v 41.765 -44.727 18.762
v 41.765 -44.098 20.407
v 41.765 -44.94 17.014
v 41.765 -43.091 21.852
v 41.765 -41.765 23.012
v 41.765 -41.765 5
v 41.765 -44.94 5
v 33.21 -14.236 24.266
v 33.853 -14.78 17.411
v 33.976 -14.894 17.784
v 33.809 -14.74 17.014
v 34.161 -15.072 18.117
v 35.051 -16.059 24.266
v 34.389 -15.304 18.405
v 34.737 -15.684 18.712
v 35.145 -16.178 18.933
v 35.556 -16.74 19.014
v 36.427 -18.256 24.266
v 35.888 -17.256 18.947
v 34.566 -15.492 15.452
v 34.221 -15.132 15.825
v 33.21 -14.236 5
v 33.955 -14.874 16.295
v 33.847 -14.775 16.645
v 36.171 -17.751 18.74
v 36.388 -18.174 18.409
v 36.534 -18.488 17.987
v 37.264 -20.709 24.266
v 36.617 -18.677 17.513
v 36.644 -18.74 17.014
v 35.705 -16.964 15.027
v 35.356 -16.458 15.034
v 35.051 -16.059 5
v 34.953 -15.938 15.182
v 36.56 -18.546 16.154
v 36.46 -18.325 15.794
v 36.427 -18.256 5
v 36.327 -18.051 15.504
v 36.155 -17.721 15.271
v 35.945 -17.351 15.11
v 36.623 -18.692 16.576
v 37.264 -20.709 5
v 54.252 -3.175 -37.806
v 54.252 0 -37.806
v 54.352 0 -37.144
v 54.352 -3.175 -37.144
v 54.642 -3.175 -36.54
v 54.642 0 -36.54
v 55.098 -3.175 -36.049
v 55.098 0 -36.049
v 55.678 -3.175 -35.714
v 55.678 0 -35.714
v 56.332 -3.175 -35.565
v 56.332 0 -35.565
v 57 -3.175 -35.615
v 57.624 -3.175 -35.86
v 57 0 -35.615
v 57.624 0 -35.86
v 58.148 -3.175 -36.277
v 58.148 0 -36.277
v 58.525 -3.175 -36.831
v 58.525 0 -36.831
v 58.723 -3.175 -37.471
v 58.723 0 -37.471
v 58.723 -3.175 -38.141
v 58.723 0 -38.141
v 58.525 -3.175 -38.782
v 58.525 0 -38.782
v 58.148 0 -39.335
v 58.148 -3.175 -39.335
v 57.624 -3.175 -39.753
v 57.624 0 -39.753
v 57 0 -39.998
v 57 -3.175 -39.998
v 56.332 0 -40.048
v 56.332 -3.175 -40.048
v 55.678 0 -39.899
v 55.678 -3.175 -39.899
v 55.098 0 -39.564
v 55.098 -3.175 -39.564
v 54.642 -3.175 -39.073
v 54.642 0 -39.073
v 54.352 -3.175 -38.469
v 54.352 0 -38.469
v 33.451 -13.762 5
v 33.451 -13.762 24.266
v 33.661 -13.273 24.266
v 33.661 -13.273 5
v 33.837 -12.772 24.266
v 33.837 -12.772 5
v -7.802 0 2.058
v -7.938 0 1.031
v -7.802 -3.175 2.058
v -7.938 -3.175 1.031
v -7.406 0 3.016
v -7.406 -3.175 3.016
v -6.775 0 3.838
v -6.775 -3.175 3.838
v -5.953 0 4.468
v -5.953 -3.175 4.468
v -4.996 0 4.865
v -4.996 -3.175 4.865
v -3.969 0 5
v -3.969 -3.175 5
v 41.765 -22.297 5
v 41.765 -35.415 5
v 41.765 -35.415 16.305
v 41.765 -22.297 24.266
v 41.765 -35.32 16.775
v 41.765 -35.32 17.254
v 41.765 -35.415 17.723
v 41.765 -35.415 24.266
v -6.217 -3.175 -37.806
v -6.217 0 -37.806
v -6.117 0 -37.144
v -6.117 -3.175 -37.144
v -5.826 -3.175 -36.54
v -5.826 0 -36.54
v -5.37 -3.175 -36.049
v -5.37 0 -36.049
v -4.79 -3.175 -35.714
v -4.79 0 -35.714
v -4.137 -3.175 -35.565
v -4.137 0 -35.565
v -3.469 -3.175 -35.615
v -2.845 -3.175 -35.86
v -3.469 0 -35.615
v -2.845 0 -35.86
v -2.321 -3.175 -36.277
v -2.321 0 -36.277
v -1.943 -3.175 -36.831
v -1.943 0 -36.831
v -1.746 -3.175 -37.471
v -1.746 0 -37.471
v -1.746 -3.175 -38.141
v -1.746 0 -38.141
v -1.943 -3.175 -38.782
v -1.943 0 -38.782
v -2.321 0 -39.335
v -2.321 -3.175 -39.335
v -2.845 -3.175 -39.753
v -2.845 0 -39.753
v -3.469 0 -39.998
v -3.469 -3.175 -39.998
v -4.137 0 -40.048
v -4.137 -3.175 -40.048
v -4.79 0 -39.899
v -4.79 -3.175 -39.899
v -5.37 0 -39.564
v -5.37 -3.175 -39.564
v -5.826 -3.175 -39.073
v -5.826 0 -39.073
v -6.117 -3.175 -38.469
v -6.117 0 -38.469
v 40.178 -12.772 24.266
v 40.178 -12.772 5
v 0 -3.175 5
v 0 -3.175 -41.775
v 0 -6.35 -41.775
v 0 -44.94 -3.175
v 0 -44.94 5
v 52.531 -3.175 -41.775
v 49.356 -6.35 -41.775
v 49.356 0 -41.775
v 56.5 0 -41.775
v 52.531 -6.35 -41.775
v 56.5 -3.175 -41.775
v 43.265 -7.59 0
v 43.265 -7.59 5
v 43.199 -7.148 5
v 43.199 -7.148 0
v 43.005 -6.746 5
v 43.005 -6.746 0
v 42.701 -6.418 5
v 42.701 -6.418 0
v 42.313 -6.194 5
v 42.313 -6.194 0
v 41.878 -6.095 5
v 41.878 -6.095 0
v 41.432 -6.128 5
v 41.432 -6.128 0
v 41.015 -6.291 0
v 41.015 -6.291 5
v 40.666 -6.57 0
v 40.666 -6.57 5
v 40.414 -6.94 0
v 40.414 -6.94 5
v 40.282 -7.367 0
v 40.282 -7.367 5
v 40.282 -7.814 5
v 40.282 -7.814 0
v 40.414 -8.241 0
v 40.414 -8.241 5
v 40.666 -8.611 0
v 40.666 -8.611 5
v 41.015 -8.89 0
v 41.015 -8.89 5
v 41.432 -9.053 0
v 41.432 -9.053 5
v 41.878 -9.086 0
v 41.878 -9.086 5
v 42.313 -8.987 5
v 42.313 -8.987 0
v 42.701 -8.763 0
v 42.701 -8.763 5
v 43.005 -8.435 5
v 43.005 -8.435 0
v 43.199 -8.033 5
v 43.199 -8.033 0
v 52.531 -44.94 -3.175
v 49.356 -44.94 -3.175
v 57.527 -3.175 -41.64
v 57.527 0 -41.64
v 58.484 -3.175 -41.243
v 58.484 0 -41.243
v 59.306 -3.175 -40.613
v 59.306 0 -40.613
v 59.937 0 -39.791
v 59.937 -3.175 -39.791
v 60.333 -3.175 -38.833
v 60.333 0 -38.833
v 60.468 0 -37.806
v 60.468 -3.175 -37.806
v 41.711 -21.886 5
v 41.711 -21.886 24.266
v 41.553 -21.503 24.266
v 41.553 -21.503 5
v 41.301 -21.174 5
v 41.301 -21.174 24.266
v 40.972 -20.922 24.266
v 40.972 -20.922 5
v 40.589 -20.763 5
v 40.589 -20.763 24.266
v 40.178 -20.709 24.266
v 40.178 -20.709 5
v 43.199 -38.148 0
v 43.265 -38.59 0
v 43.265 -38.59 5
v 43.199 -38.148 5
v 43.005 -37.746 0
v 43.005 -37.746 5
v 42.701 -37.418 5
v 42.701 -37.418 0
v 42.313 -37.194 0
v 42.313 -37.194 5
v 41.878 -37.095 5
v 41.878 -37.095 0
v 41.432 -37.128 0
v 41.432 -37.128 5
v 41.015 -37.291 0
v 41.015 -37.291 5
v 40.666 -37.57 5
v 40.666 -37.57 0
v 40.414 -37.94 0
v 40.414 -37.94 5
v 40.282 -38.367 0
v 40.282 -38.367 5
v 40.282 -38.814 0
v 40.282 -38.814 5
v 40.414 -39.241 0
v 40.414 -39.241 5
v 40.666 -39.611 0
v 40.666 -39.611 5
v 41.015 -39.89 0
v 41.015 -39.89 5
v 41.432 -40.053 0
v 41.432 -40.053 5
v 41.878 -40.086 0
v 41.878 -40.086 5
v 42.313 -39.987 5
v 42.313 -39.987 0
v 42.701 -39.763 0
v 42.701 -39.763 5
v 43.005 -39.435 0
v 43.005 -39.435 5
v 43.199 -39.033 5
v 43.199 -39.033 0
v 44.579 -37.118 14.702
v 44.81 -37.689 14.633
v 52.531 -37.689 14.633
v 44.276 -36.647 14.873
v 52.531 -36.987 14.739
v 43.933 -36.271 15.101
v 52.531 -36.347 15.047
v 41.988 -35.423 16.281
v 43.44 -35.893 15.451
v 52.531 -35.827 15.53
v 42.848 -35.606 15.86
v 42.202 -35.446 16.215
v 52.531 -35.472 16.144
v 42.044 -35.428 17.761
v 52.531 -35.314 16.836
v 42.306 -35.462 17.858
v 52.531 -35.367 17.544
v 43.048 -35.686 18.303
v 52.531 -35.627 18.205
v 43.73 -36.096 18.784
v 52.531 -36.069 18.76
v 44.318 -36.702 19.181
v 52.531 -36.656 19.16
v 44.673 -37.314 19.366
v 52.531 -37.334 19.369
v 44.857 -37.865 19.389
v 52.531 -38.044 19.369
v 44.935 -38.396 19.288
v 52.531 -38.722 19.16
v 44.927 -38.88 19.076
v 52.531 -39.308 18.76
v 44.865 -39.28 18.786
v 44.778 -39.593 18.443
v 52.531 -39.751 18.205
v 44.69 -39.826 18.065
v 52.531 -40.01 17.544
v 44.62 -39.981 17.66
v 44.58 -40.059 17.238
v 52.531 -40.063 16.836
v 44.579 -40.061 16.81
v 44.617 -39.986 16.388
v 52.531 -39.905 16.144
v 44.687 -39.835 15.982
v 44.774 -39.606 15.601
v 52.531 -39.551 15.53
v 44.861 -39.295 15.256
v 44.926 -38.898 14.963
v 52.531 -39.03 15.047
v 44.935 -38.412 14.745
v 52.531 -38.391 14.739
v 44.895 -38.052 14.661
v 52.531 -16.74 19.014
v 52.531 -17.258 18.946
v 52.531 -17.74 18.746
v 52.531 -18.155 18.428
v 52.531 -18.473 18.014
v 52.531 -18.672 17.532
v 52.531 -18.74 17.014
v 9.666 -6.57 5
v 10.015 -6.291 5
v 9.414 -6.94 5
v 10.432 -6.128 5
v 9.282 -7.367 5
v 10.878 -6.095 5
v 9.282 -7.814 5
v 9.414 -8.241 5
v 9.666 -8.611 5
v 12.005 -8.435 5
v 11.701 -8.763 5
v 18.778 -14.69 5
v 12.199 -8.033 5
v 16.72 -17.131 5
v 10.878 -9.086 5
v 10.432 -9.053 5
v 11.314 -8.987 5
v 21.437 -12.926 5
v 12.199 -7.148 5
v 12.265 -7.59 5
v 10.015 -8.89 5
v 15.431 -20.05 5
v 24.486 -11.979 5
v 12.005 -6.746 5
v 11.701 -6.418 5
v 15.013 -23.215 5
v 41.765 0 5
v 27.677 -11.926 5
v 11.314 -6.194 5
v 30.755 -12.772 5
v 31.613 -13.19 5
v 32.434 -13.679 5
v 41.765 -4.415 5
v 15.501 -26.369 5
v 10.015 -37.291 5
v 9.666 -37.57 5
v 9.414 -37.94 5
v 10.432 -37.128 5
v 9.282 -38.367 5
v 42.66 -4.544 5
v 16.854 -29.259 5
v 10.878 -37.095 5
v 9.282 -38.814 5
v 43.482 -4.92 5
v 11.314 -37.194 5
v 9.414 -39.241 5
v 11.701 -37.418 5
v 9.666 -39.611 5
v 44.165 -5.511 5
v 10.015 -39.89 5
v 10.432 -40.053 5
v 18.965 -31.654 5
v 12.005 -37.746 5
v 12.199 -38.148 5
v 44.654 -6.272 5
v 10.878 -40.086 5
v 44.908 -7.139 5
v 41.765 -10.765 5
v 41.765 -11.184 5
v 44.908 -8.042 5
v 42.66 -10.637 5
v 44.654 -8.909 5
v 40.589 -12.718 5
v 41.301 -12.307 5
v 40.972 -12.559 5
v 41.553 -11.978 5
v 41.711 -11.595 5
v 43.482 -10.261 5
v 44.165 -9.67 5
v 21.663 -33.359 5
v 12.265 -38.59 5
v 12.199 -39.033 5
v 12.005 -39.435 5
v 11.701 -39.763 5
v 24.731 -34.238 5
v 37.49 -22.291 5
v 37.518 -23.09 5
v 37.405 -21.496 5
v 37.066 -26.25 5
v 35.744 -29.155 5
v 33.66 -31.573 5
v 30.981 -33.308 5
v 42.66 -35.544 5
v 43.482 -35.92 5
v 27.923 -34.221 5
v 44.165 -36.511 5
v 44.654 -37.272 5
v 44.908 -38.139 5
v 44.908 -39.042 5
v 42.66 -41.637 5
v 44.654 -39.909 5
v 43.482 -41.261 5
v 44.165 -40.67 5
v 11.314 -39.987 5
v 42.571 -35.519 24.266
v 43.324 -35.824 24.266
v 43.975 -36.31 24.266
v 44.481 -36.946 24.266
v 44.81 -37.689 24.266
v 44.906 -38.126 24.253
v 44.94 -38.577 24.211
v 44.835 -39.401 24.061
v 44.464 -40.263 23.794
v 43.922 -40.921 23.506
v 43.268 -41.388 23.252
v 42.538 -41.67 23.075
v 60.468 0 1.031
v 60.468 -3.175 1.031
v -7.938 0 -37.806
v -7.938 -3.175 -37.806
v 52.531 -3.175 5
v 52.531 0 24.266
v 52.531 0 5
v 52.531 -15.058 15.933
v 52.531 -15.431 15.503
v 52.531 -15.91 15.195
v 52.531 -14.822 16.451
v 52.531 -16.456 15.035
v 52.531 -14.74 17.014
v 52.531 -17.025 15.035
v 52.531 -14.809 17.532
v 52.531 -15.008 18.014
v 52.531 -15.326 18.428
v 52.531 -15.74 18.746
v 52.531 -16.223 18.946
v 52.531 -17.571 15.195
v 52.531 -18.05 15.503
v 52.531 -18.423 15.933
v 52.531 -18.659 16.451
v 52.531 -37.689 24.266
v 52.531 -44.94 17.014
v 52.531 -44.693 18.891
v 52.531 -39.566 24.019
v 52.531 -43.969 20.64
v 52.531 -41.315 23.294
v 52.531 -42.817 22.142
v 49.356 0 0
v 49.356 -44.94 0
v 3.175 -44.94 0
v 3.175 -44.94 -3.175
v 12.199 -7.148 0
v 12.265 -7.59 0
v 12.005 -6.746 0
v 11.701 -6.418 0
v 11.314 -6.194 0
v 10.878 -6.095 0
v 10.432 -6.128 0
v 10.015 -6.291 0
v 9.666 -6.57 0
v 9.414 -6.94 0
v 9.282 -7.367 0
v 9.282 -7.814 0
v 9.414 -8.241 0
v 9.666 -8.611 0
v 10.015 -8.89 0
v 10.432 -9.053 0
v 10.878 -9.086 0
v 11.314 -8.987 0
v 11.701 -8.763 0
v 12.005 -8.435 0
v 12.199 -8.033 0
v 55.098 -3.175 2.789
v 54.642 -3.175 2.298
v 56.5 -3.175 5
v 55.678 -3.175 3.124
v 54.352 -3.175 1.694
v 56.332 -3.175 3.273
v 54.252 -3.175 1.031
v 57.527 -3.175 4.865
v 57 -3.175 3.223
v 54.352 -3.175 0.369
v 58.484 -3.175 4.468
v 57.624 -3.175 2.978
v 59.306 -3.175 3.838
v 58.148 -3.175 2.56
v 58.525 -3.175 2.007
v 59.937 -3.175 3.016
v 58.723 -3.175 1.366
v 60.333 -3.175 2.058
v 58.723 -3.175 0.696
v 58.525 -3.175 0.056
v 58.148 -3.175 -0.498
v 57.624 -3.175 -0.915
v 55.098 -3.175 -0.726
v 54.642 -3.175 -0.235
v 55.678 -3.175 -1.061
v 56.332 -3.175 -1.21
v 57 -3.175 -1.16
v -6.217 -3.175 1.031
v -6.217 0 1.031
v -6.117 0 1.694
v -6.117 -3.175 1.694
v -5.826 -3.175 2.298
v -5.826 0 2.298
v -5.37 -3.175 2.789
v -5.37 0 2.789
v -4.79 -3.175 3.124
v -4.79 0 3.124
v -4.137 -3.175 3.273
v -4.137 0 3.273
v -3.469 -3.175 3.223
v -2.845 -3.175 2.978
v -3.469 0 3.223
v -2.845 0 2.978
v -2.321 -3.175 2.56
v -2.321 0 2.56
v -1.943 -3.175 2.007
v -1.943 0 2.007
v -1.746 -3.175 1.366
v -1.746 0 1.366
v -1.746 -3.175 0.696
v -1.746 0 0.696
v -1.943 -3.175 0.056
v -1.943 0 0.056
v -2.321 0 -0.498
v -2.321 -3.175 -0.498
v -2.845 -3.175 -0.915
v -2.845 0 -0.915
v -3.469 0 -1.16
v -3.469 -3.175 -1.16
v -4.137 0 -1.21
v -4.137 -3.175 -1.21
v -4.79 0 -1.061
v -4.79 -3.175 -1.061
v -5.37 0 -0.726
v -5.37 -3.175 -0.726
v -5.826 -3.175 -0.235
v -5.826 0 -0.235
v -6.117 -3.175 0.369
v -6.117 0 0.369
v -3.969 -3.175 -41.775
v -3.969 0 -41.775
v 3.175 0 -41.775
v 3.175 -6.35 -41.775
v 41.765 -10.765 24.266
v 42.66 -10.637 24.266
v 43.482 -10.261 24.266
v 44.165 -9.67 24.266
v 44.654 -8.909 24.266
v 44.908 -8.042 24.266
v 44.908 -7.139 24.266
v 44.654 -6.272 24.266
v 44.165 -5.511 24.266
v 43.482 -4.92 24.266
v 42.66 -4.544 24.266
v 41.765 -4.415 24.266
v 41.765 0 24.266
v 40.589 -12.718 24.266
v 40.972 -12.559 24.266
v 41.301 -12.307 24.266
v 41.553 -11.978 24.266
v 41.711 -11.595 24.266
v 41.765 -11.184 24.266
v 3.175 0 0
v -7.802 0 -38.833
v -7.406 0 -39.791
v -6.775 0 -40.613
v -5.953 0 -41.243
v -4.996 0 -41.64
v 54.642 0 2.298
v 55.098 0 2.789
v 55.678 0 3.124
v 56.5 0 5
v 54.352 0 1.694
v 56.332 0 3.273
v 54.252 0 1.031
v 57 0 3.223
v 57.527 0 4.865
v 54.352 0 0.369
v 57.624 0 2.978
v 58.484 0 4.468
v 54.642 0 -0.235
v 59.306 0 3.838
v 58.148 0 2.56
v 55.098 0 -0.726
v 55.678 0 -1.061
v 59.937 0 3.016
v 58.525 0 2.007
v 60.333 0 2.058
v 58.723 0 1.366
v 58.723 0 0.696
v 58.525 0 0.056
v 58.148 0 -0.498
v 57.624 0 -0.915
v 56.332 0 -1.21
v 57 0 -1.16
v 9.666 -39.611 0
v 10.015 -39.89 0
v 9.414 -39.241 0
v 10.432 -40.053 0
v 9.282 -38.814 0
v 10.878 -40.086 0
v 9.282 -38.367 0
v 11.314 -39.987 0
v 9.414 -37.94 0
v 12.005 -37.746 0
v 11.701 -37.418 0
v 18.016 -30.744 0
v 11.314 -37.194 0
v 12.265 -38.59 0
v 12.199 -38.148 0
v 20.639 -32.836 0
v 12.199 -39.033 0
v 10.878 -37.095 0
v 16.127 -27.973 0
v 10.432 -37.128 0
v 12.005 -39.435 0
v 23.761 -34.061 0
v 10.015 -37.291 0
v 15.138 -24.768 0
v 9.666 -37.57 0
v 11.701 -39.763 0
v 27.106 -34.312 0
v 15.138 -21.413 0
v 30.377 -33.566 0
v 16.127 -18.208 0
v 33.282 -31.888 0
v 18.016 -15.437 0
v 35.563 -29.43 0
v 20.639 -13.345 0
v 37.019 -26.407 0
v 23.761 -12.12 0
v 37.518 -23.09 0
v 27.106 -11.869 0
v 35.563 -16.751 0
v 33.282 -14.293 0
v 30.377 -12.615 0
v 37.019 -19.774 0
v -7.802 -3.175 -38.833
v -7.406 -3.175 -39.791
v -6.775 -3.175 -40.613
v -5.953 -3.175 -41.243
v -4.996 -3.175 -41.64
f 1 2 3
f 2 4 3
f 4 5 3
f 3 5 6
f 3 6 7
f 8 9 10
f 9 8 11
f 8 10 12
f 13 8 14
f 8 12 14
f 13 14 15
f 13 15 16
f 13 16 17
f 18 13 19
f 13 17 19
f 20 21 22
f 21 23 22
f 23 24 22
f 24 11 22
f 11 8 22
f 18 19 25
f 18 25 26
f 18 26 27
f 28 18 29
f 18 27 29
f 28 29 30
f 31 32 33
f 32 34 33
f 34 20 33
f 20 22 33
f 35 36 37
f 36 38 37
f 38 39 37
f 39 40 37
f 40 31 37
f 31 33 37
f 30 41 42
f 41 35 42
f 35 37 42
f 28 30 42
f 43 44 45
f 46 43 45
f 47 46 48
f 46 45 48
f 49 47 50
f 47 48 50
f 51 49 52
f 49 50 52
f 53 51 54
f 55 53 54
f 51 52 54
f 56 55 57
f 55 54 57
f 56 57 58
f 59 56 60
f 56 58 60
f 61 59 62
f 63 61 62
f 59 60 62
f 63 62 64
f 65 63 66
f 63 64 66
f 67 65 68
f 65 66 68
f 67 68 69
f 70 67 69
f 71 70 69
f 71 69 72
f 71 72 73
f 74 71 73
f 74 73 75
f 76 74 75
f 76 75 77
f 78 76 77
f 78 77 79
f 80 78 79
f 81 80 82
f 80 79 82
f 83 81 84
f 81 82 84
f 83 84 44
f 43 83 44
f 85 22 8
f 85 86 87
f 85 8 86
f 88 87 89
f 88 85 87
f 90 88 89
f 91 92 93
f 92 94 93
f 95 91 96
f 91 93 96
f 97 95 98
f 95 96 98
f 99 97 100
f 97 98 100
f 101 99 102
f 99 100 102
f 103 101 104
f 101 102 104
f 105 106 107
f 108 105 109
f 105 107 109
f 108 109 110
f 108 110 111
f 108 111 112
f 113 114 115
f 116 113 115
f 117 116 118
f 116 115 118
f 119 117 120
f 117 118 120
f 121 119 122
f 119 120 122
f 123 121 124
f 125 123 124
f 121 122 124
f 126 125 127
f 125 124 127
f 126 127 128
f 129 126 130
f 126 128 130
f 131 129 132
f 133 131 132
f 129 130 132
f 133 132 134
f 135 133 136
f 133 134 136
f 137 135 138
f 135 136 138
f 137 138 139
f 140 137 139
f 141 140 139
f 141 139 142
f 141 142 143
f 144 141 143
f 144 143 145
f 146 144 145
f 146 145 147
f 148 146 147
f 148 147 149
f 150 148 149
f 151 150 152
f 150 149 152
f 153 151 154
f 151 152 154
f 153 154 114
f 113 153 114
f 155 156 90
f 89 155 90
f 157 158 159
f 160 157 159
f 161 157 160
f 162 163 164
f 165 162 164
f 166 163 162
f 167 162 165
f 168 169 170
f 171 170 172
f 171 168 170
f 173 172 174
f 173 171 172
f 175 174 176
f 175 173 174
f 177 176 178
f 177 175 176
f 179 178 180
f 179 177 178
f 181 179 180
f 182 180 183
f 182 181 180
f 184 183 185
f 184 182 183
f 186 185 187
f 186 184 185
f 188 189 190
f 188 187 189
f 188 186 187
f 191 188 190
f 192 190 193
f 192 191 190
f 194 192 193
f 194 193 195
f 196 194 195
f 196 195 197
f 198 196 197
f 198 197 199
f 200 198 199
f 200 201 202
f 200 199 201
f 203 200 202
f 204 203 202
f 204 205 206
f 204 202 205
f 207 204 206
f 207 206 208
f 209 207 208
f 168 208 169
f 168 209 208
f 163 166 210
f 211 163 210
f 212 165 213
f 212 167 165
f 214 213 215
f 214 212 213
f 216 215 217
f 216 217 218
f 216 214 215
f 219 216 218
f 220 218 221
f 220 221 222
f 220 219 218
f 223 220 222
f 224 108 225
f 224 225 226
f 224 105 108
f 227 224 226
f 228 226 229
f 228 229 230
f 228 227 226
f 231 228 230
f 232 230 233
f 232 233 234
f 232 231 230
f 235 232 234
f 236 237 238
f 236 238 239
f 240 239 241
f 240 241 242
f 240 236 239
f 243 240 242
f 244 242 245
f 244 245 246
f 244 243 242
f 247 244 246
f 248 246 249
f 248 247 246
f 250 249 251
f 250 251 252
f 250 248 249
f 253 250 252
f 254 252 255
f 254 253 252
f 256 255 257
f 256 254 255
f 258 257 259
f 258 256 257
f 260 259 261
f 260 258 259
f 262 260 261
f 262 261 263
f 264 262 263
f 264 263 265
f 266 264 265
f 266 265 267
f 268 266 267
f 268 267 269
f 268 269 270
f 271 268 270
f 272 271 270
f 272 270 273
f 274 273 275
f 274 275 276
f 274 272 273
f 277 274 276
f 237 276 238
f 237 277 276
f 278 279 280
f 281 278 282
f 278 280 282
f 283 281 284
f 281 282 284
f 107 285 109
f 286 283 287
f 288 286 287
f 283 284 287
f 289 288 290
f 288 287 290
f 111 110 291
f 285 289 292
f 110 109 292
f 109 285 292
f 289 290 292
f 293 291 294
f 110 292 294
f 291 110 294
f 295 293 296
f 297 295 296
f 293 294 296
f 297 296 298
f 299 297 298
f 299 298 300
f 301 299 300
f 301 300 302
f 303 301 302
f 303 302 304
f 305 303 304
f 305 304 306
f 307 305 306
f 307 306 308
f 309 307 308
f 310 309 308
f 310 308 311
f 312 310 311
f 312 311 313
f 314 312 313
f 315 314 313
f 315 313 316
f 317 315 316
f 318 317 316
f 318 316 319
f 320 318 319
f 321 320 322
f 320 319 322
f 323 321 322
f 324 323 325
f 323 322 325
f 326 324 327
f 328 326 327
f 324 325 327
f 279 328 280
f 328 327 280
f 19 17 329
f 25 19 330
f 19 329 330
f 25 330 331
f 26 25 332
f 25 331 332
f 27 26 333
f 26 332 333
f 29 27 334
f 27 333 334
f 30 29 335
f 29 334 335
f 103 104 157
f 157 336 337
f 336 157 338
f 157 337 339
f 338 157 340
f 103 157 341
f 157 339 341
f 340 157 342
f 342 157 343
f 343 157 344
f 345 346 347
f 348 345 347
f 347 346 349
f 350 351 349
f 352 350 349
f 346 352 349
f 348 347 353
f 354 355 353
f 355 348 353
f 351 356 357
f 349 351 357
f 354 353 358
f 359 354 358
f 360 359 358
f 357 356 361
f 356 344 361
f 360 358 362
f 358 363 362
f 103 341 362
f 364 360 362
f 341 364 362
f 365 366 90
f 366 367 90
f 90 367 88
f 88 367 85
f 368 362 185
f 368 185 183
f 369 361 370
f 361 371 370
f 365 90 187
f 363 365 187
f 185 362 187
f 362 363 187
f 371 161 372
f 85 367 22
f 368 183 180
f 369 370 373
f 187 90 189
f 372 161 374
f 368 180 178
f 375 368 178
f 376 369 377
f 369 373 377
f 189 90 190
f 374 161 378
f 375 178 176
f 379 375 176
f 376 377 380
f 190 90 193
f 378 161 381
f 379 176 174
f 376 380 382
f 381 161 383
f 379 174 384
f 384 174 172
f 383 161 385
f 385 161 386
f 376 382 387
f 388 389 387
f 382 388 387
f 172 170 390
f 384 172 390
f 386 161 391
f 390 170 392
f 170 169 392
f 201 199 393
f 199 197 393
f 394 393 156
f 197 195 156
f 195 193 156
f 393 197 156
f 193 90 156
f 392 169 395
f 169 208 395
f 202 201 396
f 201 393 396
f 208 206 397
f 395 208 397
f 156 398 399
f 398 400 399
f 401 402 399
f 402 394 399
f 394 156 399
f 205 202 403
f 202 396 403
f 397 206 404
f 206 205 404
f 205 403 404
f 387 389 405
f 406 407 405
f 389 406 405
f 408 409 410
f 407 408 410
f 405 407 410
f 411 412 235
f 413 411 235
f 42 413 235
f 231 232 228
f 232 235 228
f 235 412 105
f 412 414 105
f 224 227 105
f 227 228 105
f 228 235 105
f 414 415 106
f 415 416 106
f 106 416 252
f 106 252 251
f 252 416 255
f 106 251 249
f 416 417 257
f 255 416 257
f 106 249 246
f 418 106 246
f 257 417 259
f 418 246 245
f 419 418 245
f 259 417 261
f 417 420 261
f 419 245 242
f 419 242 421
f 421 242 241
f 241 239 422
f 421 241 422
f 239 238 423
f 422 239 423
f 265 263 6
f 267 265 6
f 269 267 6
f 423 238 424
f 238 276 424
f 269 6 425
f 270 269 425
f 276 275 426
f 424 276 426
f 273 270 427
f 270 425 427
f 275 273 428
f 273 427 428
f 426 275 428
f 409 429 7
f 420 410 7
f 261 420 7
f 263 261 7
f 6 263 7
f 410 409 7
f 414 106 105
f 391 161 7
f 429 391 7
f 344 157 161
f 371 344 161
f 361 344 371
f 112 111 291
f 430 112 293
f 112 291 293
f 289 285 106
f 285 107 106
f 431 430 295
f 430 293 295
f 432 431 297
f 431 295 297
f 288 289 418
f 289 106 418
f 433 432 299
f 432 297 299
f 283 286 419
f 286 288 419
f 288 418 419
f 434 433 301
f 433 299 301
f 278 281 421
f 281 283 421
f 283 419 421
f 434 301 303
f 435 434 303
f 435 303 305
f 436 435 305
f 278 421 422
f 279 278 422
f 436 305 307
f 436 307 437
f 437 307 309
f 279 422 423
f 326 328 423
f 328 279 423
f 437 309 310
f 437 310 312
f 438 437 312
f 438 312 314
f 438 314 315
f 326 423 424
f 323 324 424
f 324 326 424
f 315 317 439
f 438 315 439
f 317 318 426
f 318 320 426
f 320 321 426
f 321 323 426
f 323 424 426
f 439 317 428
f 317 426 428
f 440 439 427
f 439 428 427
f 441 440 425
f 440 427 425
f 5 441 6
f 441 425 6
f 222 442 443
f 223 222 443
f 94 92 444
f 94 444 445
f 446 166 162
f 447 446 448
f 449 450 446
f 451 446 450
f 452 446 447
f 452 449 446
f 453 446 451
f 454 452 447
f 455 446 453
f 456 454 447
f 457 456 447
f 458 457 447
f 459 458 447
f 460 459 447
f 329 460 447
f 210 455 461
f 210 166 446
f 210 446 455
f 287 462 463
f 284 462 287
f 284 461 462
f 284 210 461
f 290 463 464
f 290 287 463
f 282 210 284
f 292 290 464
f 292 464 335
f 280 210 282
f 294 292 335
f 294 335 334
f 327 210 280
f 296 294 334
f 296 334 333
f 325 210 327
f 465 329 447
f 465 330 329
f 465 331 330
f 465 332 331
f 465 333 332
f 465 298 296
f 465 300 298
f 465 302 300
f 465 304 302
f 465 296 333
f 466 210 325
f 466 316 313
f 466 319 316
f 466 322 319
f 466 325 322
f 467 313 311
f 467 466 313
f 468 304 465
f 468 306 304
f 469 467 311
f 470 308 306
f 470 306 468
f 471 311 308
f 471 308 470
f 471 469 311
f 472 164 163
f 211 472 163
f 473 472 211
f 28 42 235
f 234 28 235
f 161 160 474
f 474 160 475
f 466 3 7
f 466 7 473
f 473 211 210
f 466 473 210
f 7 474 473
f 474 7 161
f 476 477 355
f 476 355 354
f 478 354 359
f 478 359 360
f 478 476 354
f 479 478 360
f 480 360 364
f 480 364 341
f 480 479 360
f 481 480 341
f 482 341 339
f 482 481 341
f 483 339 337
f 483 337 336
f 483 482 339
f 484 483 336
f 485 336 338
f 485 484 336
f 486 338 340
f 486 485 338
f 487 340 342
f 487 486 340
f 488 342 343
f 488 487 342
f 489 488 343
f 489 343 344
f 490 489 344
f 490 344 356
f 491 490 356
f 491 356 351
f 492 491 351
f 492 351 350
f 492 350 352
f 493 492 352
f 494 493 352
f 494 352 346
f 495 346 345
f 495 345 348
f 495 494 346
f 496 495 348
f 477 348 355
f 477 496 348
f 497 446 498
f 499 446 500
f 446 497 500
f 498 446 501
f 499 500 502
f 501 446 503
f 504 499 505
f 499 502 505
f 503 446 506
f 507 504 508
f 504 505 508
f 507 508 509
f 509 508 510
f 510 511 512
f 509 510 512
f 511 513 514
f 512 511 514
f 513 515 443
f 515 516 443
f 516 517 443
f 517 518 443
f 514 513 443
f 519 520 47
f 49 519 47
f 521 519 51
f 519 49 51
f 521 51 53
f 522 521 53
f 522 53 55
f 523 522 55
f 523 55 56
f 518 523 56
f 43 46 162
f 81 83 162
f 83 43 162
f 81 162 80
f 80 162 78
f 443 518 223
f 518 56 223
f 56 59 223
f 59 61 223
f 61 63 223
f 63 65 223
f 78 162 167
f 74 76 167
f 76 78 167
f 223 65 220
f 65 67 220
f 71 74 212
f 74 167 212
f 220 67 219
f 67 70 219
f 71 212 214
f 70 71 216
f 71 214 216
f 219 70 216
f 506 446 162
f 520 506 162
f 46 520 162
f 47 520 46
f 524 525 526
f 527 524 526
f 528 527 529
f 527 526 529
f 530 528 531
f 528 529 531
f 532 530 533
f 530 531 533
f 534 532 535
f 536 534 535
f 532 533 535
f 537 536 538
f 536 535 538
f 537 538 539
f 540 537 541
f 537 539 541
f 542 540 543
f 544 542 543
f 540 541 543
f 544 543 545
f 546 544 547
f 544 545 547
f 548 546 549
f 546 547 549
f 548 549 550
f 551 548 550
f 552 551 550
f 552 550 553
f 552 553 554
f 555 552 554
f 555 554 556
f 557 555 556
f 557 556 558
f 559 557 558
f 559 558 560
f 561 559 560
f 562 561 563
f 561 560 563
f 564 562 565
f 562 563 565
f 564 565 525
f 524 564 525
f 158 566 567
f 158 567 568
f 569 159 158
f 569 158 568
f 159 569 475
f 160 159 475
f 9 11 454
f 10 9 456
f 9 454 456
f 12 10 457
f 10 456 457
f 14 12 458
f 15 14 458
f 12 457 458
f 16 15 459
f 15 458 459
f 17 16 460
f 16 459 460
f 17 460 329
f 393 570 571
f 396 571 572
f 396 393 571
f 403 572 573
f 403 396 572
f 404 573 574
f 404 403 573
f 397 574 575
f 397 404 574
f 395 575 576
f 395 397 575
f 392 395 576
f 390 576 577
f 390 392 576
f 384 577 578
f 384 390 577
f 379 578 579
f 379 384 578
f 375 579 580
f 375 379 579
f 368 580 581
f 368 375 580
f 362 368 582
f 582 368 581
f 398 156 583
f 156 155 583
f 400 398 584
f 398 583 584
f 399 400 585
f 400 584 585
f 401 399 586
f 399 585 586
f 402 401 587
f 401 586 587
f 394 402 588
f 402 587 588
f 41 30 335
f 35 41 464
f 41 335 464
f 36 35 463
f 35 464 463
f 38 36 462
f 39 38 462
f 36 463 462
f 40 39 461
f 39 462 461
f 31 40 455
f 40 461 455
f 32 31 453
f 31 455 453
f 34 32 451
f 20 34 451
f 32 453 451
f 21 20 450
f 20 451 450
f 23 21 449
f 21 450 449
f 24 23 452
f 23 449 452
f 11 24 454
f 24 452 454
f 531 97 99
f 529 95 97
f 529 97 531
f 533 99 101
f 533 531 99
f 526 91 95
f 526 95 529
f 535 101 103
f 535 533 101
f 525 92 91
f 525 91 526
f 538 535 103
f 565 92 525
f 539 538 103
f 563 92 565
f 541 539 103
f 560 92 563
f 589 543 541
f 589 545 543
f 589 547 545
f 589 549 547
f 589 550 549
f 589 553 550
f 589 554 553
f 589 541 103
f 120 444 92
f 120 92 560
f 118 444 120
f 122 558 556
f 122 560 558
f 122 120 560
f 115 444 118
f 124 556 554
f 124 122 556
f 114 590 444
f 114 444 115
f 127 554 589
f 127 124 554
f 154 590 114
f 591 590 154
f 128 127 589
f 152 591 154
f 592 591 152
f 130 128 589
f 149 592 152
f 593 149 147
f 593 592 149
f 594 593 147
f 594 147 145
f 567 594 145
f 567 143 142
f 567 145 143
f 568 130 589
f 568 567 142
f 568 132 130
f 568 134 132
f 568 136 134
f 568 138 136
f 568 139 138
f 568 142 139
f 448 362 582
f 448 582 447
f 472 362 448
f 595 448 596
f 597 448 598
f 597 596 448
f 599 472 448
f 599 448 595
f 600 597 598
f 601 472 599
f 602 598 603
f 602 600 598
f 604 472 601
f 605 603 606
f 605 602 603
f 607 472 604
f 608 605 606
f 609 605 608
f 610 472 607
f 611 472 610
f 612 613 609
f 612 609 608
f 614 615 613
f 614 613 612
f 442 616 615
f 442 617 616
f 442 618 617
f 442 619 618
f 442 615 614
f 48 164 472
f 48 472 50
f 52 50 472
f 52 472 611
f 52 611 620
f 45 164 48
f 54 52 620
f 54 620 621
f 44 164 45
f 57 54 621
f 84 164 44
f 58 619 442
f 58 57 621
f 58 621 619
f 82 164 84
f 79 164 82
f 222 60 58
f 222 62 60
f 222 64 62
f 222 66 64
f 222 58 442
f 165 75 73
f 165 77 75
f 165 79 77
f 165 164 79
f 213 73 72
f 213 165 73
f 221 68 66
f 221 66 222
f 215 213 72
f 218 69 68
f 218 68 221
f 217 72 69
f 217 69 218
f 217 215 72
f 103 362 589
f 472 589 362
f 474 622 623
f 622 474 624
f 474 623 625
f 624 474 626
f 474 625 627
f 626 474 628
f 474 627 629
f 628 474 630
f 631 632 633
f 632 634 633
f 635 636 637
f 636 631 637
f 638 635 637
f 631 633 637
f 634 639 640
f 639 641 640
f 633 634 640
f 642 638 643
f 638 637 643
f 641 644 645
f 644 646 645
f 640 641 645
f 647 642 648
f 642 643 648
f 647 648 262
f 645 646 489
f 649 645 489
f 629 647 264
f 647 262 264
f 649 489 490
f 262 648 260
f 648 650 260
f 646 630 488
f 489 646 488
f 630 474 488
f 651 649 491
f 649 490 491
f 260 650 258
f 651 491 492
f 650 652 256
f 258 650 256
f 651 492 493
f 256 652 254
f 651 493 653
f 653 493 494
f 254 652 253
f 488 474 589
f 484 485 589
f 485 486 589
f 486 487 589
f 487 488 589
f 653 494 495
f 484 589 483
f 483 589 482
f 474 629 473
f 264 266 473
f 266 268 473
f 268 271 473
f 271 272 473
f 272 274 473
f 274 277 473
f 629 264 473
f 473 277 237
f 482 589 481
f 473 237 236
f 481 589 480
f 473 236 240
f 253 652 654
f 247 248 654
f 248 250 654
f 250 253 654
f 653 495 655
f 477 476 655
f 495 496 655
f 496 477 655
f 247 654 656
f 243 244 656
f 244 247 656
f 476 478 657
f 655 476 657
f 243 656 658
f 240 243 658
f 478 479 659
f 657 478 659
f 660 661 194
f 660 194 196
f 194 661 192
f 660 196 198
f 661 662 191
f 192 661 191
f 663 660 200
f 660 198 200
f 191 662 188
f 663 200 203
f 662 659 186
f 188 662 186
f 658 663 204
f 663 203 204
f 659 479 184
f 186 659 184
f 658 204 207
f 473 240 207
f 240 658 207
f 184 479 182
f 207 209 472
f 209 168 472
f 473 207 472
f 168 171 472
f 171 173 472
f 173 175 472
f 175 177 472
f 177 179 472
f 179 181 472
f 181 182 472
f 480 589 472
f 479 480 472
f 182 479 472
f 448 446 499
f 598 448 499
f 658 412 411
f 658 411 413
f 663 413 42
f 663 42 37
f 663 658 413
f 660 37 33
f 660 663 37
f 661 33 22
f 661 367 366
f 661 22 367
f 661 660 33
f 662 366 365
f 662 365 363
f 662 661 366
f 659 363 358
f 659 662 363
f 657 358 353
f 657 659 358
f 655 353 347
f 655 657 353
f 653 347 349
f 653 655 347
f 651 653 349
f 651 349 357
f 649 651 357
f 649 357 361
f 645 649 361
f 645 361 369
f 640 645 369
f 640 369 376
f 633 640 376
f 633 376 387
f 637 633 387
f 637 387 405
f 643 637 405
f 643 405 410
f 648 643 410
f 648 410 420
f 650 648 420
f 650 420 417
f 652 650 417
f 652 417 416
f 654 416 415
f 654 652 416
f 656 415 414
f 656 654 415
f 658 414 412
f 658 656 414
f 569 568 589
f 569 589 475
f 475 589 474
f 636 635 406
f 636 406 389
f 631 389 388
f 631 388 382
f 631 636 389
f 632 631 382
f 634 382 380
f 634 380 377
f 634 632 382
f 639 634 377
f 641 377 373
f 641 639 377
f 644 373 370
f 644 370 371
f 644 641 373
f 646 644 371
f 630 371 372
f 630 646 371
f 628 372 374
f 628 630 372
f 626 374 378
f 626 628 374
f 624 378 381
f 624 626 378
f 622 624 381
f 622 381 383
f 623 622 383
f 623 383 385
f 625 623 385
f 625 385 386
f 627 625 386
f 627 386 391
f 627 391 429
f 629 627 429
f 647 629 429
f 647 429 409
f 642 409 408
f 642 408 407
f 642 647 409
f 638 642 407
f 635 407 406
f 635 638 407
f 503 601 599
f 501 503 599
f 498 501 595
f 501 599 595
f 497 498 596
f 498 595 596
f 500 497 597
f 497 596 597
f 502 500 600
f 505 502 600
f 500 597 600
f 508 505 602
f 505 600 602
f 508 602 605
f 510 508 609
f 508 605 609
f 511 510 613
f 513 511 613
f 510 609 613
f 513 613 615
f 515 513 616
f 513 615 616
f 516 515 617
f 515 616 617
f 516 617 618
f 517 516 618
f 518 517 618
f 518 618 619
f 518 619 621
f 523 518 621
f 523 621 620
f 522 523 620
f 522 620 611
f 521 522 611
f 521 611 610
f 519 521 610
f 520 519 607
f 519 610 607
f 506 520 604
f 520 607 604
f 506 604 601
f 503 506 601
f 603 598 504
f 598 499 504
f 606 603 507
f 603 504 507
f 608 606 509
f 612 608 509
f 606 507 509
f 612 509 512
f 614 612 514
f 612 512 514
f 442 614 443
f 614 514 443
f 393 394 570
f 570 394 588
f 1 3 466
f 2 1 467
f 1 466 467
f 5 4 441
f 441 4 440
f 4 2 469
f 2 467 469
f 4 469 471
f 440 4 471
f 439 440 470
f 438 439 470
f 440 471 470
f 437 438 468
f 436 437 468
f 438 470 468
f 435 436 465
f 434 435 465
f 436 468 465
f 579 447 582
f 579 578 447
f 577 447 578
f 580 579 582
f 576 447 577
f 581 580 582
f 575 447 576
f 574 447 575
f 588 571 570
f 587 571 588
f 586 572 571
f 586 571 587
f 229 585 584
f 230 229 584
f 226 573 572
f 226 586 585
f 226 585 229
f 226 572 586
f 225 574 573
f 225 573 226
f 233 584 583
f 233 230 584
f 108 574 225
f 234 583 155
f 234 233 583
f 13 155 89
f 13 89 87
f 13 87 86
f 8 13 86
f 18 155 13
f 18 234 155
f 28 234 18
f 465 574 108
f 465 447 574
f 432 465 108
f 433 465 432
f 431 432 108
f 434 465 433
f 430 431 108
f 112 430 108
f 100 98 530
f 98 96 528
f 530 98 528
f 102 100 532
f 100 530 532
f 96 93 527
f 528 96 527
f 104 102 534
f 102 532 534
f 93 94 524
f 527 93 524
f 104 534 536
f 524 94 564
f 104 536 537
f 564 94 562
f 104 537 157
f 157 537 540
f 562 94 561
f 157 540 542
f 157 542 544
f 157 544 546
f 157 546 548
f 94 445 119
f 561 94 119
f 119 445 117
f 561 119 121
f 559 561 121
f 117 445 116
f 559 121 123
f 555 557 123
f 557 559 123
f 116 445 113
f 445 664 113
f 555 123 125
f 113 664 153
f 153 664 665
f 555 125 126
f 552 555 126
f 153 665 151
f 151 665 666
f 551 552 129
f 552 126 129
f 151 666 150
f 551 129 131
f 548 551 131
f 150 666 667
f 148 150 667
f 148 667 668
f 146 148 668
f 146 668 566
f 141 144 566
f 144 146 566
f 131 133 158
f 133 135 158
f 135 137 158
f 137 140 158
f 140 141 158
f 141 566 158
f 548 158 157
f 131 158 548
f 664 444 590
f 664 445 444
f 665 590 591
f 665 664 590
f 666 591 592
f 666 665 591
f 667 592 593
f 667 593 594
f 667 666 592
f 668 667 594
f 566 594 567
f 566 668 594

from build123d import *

# Parameters (mm, degrees)
F0_W      = 52.5309846
F0_H      = 44.9404867
F0_R      = 1.5
F0_R_2    = 11.2530001
F1_DEPTH  = 5
F2_W      = 3.175
F2_H      = 44.9404867
F3_DEPTH  = 41.774999
F4_W      = 7.9375
F4_H      = 3.175
F5_DEPTH  = 46.774999
F6_R      = 3.96875
F7_R      = 2.2479
F8_DEPTH  = 3.175
F10_DEPTH = 52.5309846
F12_DEPTH = 19.2659
F14_DEPTH = 10.7654979
F15_R     = 7.9375
F16_DEPTH = 25.4
F17_DEPTH = 30.4370867
F18_R     = 3.175
F19_DEPTH = 19.2659
F21_DEPTH = 133
F22_R     = 7.2517
F23_R     = 1.5875


# Not quite as in the source:
# - an extrude ends at something that could not be found from the text; its depth is read off the source's solid
# - a feature names something its author has since deleted; it is built from what else it names


with BuildPart() as f1:
    # F0 (on Top) → F1 (new body)
    with BuildSketch(Plane.XY):
        with Locations((26.2654923, -22.47024335)):
            Rectangle(F0_W, F0_H)
        with Locations((10.7654979, -38.5904867)):
            Circle(F0_R, mode=Mode.SUBTRACT)
        with Locations((26.2654923, -23.0904923)):
            Circle(F0_R_2, mode=Mode.SUBTRACT)
        with Locations((41.7654867, -38.5904867)):
            Circle(F0_R, mode=Mode.SUBTRACT)
        with Locations((10.7654979, -7.5904979)):
            Circle(F0_R, mode=Mode.SUBTRACT)
        with Locations((41.7654867, -7.5904979)):
            Circle(F0_R, mode=Mode.SUBTRACT)
    extrude(amount=F1_DEPTH)

    # F2 (on face) → F3 (join)
    with BuildSketch(Plane(origin=(0, 0, 0), x_dir=(1, 0, 0), z_dir=(0, 0, -1))):
        with Locations((1.5875, 22.47024335)):
            Rectangle(F2_W, F2_H)
        with Locations((50.9434846, 22.47024335)):
            Rectangle(F2_W, F2_H)
    extrude(amount=F3_DEPTH)

    # F4 (on face) → F5 (join, through all)
    with BuildSketch(Plane(origin=(0, 0, -41.774999), x_dir=(1, 0, 0), z_dir=(0, 0, -1))):
        with Locations((-3.96875, 1.5875)):
            Rectangle(F4_W, F4_H)
        with Locations((56.4997346, 1.5875)):
            Rectangle(F4_W, F4_H)
    extrude(amount=-F5_DEPTH)

    # F6
    f6_edges = [f1.edges().sort_by_distance(p)[0] for p in [
        (60.468485, -1.5875, -41.774999),
        (60.468485, -1.5875, 5),
        (-7.9375, -1.5875, 5),
        (-7.9375, -1.5875, -41.774999),
    ]]
    fillet(f6_edges, radius=F6_R)

    # F7 (on face) → F8 (cut, through all)
    with BuildSketch(Plane(origin=(0, 0, 0), x_dir=(-1, 0, 0), z_dir=(0, 1, 0))):
        with Locations((3.96875, -37.806249)):
            Circle(F7_R)
        with Locations((3.96875, 1.03125)):
            Circle(F7_R)
        with Locations((-56.4997346, 1.03125)):
            Circle(F7_R)
        with Locations((-56.4997346, -37.806249)):
            Circle(F7_R)
    extrude(amount=-F8_DEPTH, mode=Mode.SUBTRACT)

    # F9 (on face) → F10 (cut, through all)
    with BuildSketch(Plane.YZ.offset(52.5309846)):
        Polygon((-44.9404867, -3.175), (-44.9404867, -41.774999), (-6.35, -41.774999), align=None)
    extrude(amount=-F10_DEPTH, mode=Mode.SUBTRACT)

    # F11 (on face) → F12 (join)
    with BuildSketch(Plane.XY.offset(5)):
        with BuildLine():
            Line((41.7654867, -44.9404867), (52.5309846, -44.9404867))
            Line((52.5309846, -44.9404867), (52.5309846, -30.4370867))
            Line((52.5309846, -30.4370867), (41.7654867, -30.4370867))
            Line((41.7654867, -30.4370867), (41.7654867, -35.4154867))
            ThreePointArc((41.7654867, -35.4154867), (44.9404867, -38.5904867), (41.7654867, -41.7654867))
            Line((41.7654867, -41.7654867), (41.7654867, -44.9404867))
        make_face()
        with BuildLine():
            Line((52.5309846, -20.7092423), (52.5309846, -12.7717423))
            Line((52.5309846, -12.7717423), (30.7547472146, -12.7717423))
            ThreePointArc((30.7547472146, -12.7717423), (34.966988133, -15.9550889113), (37.2636584966, -20.7092423))
            Line((37.2636584966, -20.7092423), (52.5309846, -20.7092423))
        make_face()
    extrude(amount=F12_DEPTH)

    # F13 (on face) → F14 (cut, through all)
    with BuildSketch(Plane.YZ.offset(52.5309846)):
        with BuildLine():
            Line((-40.0700367, 17.0142), (-37.6887867, 17.0142))
            Line((-37.6887867, 17.0142), (-37.6887867, 14.63295))
            ThreePointArc((-37.6887867, 14.63295), (-36.0049886773, 15.3304019773), (-35.3075367, 17.0142))
            ThreePointArc((-35.3075367, 17.0142), (-37.6887867, 19.39545), (-40.0700367, 17.0142))
        make_face()
        with BuildLine():
            Line((-37.6887867, 14.63295), (-37.6887867, 17.0142))
            Line((-37.6887867, 17.0142), (-40.0700367, 17.0142))
            ThreePointArc((-40.0700367, 17.0142), (-39.3725847227, 15.3304019773), (-37.6887867, 14.63295))
        make_face()
    extrude(amount=-F14_DEPTH, mode=Mode.SUBTRACT)

    # F15 (on face) → F16 (cut)
    with BuildSketch(Plane.XY.offset(5)):
        with Locations((26.2654923, -10.3904923)):
            Circle(F15_R)
    extrude(amount=F16_DEPTH, mode=Mode.SUBTRACT)

    # F17 (add, through all): a face of the model
    f17_faces = [f1.faces().sort_by_distance(p)[0] for p in [
        (47.14823565, -30.4370867, 14.63295),
    ]]
    extrude(f17_faces, amount=F17_DEPTH)

    # F18 (on face) → F19 (cut, through all)
    with BuildSketch(Plane.XY.offset(5)):
        with Locations((41.7654867, -7.5904979)):
            Circle(F18_R)
    extrude(amount=F19_DEPTH, mode=Mode.SUBTRACT)

    # F20 (on face) → F21 (cut, through all)
    with BuildSketch(Plane.YZ.offset(52.5309846)):
        with BuildLine():
            ThreePointArc((-16.7404923, 19.0142), (-18.1547058624, 18.4284135624), (-18.7404923, 17.0142))
            Line((-18.7404923, 17.0142), (-16.7404923, 17.0142))
            Line((-16.7404923, 17.0142), (-16.7404923, 19.0142))
        make_face()
        with BuildLine():
            Line((-16.7404923, 17.0142), (-18.7404923, 17.0142))
            ThreePointArc((-18.7404923, 17.0142), (-16.7404923, 15.0142), (-14.7404923, 17.0142))
            ThreePointArc((-14.7404923, 17.0142), (-15.3262787376, 18.4284135624), (-16.7404923, 19.0142))
            Line((-16.7404923, 19.0142), (-16.7404923, 17.0142))
        make_face()
    extrude(amount=-F21_DEPTH, mode=Mode.SUBTRACT)

    # F22
    f22_edges = [f1.edges().sort_by_distance(p)[0] for p in [
        (47.148236, -44.940487, 24.2659),
    ]]
    fillet(f22_edges, radius=F22_R)

    # F23
    f23_edges = [f1.edges().sort_by_distance(p)[0] for p in [
        (41.765487, -20.709242, 14.63295),
        (41.765487, -12.771742, 14.63295),
    ]]
    fillet(f23_edges, radius=F23_R)


solid = f1.part
